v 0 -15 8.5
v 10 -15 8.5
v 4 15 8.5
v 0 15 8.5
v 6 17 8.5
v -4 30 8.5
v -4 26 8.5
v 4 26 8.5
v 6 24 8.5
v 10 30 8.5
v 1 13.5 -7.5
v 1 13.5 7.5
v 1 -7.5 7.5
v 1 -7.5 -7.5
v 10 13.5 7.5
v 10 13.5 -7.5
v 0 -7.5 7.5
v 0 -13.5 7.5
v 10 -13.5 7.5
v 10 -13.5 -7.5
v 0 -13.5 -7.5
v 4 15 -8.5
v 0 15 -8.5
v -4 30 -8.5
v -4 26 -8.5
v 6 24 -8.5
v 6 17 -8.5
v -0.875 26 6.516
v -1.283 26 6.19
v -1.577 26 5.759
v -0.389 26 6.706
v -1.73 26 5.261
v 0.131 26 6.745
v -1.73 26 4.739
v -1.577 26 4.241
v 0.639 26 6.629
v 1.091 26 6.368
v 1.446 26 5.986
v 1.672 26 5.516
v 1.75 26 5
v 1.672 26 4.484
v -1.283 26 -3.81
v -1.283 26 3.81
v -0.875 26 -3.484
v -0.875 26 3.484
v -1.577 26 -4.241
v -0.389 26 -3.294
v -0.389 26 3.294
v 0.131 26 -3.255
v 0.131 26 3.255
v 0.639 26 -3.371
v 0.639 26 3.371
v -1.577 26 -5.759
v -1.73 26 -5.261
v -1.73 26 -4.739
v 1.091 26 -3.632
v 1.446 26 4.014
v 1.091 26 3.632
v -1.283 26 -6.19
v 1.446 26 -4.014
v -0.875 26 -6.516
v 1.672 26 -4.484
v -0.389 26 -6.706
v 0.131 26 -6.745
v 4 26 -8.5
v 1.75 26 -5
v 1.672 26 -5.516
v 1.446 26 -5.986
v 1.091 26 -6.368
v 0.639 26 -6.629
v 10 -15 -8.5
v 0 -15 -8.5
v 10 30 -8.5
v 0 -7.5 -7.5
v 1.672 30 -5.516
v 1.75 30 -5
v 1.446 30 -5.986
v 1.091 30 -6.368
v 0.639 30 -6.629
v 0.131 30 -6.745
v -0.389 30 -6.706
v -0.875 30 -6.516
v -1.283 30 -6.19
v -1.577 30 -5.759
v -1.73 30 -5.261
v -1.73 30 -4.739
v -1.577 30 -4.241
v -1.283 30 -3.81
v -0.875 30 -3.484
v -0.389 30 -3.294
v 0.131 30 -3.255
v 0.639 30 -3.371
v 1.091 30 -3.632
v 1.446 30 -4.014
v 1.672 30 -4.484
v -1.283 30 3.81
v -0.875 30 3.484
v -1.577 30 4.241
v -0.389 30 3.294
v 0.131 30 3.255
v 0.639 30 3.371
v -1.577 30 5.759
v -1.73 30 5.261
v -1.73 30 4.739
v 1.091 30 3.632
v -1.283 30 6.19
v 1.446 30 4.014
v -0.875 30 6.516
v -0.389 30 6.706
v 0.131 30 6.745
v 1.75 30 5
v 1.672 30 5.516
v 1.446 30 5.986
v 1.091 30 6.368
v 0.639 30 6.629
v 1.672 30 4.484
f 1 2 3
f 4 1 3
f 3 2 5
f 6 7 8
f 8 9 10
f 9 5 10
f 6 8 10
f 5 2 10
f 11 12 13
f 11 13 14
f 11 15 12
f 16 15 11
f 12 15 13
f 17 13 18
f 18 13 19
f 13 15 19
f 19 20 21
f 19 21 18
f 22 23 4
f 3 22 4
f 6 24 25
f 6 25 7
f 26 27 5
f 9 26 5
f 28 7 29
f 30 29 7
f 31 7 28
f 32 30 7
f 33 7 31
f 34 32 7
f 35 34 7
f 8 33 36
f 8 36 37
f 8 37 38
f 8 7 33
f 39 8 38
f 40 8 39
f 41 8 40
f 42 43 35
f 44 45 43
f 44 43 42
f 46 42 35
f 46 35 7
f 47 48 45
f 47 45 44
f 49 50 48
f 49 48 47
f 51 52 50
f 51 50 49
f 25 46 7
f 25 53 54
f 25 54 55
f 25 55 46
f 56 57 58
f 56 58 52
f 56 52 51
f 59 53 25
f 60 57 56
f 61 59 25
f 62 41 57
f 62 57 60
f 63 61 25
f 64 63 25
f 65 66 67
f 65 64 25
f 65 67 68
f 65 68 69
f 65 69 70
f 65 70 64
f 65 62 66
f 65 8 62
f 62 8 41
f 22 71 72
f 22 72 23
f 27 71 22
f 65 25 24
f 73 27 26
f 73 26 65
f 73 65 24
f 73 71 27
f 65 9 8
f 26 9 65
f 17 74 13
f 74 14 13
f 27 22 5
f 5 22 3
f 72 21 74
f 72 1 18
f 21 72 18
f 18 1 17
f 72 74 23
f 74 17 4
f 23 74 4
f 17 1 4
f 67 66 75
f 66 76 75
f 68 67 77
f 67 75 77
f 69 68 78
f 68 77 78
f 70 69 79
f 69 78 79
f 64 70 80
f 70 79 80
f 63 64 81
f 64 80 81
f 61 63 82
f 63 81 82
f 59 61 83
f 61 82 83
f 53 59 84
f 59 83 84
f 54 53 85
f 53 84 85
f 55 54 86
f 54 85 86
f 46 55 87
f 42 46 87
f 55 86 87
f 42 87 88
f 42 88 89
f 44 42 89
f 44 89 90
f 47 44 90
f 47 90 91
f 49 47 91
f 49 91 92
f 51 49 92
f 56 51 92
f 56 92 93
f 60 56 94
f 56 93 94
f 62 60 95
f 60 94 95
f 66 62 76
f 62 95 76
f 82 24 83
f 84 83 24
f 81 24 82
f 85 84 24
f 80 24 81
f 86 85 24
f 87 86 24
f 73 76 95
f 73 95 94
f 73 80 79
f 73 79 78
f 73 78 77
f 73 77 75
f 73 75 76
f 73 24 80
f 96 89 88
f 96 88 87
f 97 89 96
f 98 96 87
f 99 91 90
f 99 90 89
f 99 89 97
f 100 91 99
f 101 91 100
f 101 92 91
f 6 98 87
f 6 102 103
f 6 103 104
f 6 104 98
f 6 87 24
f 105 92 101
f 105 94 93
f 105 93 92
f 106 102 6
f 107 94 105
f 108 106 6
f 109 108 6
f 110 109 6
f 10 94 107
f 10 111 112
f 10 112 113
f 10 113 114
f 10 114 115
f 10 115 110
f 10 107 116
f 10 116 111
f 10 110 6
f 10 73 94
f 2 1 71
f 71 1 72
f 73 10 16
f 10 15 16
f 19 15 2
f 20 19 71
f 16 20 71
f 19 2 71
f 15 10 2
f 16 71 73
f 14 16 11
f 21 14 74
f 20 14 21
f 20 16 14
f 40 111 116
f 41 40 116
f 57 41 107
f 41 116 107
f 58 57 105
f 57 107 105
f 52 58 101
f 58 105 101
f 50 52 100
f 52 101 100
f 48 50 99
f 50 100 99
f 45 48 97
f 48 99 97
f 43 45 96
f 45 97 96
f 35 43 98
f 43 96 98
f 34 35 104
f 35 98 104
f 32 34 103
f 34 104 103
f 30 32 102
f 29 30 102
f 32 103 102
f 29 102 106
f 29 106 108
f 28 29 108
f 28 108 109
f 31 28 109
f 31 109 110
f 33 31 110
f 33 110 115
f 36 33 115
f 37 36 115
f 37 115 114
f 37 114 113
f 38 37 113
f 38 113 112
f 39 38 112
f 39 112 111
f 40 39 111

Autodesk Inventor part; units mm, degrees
ref_plane "YZ Plane" through (0, 0, 0) normal (1, 0, 0) x (0, 1, 0)
ref_plane "XZ Plane" through (0, 0, 0) normal (0, 1, 0) x (-1, 0, 0)
ref_plane "XY Plane" through (0, 0, 0) normal (0, 0, 1) x (1, 0, 0)
sketch "Esquisse1" plane through (0, 0, 0) normal (1, 0, 0) x (0, 1, 0)
  line L0 (15, 8.5) -> (-15, 8.5)
  line L1 (-15, 8.5) -> (-15, -8.5)
  line L2 (-15, -8.5) -> (15, -8.5)
  line L3 (15, -8.5) -> (15, 8.5)
  point P0 (0, 0)
  point P1 (0, 0)
  point P2 (0, 0)
  dimension "d4" = 30
  dimension "d5" = 17
extrude "Extrusion1" add sketch "Esquisse1" along normal blind 10
sketch "Esquisse2" plane through (10, 0, 0) normal (1, 0, 0) x (0, 0, -1)
  line L0 (-7.5, 13.5) -> (7.5, 13.5)
  line L1 (7.5, 13.5) -> (7.5, -13.5)
  line L2 (7.5, -13.5) -> (-7.5, -13.5)
  line L3 (-7.5, -13.5) -> (-7.5, 13.5)
  line L4 (-7.5, 13.5) -> (7.5, -13.5)
  line L5 (-7.5, -13.5) -> (7.5, 13.5)
  point P0 (0, 0)
  point P1 (0, 0)
  point P2 (0, 0)
  dimension "d8" = 27
  dimension "d9" = 15
extrude "Extrusion2" cut sketch "Esquisse2" against normal blind 9
sketch "Esquisse3" plane through (1, 0, 0) normal (1, 0, 0) x (0, 0, -1)
  line L0 (7.5, -13.5) -> (-7.5, -13.5) projected
  line L1 (7.5, 13.5) -> (7.5, -13.5) projected
  line L2 (-7.5, -13.5) -> (7.5, -13.5)
  line L3 (7.5, -13.5) -> (7.5, -7.5)
  line L4 (7.5, -7.5) -> (-7.5, -7.5)
  line L5 (-7.5, -7.5) -> (-7.5, -13.5)
  point P0 (0, 0)
  dimension "d12" = 6
extrude "Extrusion3" cut sketch "Esquisse3" against normal blind 9
sketch "Esquisse9" plane through (0, 15, 8.5) normal (0, 1, 0) x (1, 0, 0)
  line L0 (0, 17) -> (10, 17) projected
  line L1 (0, 0) -> (10, 0) projected
  line L2 (10, 17) -> (6, 17)
  line L3 (6, 17) -> (6, 0)
  line L4 (6, 0) -> (10, 0)
  line L5 (10, 0) -> (10, 17)
  point P0 (0, 8.5)
  dimension "d58" = 4
extrude "Extrusion10" add sketch "Esquisse9" along normal blind 15
sketch "Esquisse10" plane through (6, 15, -8.5) normal (-1, 0, 0) x (0, 0, 1)
  line L0 (0, -30) -> (0, 15) projected
  line L1 (17, -30) -> (17, 15) projected
  line L2 (0, 15) -> (17, 15)
  line L3 (17, 15) -> (17, 11)
  line L4 (17, 11) -> (0, 11)
  line L5 (0, 11) -> (0, 15)
  point P0 (8.5, -15)
  point P1 (17, 15)
  point P2 (0, 11)
  dimension "d61" = 4
extrude "Extrusion11" add sketch "Esquisse10" along normal blind 10
chamfer "Chanfrein3" distance 2 angle 45 1 edges at (6, 26, 0)
chamfer "Chanfrein4" distance 2 angle 45 1 edges at (6, 15, 0)
sketch "Esquisse11" plane through (0, 30, 8.5) normal (0, 1, 0) x (1, 0, 0)
  line L0 (0, 17) -> (0, 0) projected
  circle A0 centre (0, 13.5) radius 1.75
  circle A1 centre (0, 3.5) radius 1.75
  line L1 (10, 17) -> (-4, 17) projected
  line L2 (0, 8.5) -> (10, 8.5) construction
  dimension "d70" = 3.5
  dimension "d71" = 3.5
  dimension "d72" = 10
extrude "Extrusion12" cut sketch "Esquisse11" against normal blind 10
properties part number "POUPLY_P6"
